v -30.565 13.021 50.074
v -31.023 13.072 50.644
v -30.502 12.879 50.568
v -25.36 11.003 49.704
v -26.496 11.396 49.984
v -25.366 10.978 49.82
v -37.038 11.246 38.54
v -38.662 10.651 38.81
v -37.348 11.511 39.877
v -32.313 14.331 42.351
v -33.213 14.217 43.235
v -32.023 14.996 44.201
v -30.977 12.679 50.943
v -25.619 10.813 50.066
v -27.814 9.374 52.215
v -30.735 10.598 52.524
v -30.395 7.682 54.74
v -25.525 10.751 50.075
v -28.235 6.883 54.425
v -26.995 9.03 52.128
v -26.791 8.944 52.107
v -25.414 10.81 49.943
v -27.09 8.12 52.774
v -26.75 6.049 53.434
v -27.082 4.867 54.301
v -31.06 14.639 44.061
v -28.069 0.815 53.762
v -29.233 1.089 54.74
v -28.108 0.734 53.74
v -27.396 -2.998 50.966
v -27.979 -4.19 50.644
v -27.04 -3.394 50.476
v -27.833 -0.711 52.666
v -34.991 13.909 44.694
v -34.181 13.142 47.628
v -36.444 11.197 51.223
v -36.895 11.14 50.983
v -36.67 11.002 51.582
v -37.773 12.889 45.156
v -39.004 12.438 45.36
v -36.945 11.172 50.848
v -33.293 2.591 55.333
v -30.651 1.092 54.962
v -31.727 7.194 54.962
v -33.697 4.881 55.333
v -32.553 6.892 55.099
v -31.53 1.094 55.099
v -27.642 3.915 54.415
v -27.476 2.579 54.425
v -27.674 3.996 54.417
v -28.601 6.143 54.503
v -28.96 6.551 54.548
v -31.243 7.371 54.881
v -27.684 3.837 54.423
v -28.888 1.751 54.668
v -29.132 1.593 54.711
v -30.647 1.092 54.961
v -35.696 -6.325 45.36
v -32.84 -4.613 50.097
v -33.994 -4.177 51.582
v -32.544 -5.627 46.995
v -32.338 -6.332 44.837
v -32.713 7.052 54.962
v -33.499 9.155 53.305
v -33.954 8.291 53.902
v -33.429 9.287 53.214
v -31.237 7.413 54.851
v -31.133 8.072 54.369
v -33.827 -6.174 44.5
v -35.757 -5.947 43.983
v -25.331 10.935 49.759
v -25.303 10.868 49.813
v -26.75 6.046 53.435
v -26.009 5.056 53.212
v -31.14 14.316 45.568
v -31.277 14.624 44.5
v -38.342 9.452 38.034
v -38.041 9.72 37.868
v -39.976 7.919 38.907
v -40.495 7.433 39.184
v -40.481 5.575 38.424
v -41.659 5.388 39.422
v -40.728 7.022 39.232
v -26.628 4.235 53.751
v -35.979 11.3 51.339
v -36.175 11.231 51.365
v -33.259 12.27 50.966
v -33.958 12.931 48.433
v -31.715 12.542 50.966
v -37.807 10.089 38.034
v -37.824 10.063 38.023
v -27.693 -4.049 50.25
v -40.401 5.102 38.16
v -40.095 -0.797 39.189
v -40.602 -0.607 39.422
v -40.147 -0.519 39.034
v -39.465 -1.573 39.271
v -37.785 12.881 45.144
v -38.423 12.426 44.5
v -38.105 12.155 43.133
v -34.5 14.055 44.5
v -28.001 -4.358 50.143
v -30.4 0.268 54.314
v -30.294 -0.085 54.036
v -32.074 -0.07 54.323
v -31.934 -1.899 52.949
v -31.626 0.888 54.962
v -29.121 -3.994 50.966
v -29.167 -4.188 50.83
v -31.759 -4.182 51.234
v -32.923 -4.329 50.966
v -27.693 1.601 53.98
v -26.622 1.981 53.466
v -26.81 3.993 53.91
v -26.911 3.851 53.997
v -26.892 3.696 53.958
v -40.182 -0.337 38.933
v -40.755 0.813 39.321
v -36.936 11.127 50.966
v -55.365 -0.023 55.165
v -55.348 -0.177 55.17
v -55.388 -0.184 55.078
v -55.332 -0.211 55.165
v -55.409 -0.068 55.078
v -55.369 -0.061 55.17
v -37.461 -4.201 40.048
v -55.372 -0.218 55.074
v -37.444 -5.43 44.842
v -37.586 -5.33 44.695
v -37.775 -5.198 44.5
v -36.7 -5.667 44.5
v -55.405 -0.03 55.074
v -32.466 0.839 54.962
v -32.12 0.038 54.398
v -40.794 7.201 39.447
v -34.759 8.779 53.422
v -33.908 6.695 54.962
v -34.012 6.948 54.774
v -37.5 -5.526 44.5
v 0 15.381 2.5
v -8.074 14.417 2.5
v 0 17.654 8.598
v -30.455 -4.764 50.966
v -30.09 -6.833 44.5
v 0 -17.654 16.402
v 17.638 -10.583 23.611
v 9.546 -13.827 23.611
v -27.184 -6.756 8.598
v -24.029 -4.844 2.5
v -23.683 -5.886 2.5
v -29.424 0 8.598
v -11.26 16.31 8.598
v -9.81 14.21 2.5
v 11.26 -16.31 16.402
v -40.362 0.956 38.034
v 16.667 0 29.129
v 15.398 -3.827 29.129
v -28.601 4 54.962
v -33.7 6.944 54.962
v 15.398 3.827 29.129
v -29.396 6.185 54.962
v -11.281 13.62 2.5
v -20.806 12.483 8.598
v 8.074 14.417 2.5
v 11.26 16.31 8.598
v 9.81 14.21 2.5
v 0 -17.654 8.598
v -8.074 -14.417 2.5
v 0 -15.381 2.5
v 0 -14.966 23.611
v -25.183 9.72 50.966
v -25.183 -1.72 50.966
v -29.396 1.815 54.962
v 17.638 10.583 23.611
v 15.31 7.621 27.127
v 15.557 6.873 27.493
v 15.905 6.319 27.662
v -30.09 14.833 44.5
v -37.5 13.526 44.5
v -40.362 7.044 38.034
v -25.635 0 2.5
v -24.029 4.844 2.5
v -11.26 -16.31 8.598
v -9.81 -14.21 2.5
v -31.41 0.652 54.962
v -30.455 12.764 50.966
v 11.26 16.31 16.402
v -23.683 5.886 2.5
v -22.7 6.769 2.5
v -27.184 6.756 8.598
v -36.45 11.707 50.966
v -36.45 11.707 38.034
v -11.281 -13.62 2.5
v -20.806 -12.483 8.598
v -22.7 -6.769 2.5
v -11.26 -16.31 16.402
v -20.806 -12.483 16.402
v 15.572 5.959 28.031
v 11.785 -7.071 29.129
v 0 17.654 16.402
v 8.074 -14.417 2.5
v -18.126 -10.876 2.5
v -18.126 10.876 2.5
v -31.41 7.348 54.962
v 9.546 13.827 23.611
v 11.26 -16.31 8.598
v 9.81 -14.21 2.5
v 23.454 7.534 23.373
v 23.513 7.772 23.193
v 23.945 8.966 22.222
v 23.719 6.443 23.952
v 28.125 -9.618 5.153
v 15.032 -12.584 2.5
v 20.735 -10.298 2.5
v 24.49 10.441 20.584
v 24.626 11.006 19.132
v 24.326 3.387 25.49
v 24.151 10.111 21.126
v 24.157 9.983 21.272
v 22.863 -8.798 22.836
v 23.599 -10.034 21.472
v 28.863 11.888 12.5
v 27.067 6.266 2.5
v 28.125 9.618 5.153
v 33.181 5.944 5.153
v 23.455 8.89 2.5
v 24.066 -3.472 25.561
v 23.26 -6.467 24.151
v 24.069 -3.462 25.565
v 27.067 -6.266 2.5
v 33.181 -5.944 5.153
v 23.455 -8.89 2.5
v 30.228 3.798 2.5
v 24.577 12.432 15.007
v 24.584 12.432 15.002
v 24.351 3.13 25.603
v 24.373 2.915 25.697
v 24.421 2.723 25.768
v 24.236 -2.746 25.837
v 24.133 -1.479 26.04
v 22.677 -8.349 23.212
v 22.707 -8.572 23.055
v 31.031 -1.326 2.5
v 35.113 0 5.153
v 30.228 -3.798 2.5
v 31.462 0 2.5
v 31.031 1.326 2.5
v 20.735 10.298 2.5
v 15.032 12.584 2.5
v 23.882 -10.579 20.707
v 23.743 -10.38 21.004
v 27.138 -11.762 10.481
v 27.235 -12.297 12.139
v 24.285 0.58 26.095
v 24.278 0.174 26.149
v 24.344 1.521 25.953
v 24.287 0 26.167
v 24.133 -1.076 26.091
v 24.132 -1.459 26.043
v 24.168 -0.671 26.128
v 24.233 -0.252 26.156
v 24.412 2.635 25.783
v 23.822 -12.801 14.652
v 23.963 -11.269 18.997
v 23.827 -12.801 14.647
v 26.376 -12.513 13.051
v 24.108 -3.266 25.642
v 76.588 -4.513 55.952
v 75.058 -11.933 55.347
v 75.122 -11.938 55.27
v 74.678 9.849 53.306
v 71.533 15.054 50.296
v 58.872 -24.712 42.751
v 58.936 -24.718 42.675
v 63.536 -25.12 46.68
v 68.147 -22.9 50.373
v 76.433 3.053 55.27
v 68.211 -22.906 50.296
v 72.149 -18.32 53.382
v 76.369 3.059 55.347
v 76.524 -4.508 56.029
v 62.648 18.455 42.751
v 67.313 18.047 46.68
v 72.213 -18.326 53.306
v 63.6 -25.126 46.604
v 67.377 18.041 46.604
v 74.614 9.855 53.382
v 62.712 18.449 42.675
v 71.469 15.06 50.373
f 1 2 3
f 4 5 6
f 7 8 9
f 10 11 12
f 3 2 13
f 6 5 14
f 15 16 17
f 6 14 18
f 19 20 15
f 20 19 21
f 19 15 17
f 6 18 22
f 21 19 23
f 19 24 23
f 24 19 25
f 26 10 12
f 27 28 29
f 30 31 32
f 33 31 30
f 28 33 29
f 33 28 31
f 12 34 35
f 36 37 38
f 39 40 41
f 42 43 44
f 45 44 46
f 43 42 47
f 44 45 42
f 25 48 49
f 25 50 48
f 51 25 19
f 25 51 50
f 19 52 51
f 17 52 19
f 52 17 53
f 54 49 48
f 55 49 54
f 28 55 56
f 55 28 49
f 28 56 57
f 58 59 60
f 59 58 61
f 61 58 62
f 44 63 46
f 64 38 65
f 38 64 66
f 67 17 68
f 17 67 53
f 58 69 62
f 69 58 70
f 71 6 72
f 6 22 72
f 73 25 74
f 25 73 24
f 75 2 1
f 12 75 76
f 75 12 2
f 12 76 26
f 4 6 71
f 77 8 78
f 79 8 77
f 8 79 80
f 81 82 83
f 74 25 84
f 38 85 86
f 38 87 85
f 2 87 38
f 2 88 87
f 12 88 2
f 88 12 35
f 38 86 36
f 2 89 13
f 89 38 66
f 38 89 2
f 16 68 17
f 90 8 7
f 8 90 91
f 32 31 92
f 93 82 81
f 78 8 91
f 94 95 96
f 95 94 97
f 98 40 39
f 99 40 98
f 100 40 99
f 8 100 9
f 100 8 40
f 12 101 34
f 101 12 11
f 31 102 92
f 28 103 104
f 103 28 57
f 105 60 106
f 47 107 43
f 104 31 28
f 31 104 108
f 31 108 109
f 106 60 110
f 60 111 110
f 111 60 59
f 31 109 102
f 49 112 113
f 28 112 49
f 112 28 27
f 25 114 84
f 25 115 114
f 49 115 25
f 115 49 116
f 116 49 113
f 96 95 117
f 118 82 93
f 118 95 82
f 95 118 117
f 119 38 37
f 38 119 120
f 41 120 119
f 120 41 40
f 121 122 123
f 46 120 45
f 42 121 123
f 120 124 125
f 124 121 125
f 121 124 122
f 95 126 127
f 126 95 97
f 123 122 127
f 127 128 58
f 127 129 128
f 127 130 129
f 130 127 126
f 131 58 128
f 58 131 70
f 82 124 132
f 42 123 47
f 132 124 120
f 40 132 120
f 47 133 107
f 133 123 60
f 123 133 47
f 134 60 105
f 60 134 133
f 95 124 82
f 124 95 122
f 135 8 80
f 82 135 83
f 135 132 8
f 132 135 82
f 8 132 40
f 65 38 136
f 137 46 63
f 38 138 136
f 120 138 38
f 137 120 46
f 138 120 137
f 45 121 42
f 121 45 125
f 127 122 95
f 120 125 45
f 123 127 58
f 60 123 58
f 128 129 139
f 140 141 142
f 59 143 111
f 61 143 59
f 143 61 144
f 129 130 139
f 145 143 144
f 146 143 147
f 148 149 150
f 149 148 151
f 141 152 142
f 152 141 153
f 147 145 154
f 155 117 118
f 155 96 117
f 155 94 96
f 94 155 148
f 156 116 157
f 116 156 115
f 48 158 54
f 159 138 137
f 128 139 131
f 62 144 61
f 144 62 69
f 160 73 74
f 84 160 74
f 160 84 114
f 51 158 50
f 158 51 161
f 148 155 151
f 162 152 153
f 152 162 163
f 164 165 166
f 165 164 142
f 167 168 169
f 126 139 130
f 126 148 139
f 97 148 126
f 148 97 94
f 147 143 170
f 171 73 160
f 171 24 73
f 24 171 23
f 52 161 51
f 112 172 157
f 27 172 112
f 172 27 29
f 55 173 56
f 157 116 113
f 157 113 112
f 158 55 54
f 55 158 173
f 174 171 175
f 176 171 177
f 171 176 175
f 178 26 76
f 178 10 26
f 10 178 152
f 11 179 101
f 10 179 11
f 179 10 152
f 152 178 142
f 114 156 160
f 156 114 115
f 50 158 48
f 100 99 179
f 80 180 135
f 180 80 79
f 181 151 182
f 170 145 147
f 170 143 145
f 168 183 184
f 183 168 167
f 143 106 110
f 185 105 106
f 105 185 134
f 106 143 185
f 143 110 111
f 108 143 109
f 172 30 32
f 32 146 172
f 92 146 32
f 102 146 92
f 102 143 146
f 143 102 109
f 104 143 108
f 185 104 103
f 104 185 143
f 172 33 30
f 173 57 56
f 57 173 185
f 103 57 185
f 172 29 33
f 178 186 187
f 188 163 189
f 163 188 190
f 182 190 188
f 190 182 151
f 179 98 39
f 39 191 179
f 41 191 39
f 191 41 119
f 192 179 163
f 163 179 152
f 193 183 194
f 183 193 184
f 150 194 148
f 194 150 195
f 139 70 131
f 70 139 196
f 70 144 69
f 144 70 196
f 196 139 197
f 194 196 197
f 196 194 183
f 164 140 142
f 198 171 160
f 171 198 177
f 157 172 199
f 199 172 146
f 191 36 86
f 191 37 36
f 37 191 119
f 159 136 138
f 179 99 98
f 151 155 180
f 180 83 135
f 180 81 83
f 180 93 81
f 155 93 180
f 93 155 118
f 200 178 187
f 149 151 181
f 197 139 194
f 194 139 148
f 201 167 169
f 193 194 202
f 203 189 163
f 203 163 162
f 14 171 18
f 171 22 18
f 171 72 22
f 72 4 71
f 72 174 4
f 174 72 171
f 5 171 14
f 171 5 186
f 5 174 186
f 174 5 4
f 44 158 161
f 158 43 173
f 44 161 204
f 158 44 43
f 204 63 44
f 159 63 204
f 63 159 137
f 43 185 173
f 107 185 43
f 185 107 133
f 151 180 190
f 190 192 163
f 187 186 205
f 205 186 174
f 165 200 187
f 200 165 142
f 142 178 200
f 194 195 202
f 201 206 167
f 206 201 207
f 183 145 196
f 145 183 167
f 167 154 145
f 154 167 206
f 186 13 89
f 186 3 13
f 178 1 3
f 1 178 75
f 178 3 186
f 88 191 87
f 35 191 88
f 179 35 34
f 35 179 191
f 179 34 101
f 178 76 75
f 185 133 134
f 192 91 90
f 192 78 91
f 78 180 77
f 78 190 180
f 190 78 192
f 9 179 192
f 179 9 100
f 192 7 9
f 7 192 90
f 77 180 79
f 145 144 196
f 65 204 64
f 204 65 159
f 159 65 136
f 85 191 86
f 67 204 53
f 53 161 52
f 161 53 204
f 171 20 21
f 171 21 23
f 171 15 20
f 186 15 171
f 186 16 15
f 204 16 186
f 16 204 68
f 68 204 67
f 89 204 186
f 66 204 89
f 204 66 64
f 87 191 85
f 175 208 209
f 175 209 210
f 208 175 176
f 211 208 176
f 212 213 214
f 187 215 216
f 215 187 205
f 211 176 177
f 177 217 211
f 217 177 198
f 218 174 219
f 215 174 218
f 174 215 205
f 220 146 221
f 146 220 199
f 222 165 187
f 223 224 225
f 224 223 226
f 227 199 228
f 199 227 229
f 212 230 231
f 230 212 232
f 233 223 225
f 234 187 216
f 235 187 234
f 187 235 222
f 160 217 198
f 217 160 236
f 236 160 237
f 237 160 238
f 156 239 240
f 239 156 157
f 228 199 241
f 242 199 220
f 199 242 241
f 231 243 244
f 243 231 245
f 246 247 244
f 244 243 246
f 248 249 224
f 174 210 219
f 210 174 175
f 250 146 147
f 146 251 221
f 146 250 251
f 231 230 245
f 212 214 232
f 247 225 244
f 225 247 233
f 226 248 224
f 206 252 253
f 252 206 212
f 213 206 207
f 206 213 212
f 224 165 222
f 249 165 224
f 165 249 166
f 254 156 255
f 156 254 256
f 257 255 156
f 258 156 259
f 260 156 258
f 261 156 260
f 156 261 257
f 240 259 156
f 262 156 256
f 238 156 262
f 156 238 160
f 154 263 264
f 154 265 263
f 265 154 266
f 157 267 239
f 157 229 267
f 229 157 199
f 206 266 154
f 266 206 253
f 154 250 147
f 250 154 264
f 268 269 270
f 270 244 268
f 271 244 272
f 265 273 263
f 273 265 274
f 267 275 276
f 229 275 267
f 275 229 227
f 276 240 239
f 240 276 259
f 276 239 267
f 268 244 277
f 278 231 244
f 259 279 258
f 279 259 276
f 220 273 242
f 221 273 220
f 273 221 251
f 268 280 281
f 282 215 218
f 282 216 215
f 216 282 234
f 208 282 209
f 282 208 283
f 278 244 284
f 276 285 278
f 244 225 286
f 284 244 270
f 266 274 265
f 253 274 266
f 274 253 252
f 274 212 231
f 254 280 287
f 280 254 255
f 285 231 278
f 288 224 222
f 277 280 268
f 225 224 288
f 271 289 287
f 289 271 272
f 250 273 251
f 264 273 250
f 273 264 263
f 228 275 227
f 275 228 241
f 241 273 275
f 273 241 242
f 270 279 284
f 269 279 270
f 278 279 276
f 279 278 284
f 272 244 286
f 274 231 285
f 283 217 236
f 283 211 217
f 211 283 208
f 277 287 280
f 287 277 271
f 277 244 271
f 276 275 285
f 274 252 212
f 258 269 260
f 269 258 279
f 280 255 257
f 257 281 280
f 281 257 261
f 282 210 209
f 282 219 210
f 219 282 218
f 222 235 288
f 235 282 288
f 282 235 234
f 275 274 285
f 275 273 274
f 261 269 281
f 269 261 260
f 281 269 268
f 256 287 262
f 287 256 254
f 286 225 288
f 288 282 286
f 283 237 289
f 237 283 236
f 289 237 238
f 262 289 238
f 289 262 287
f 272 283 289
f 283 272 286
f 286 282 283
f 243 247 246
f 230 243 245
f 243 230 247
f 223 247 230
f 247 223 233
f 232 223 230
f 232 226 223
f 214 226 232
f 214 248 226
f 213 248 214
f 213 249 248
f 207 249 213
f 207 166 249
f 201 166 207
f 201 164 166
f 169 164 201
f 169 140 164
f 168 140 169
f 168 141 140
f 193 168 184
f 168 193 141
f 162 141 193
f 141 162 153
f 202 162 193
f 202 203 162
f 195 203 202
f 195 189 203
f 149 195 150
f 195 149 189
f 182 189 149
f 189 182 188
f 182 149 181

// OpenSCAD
// [FL_INDEX: keywords="openscad, 3d_parametric, Bird-o-matic___design_your_printable_bird, csg_solid" | COT="Parametric OpenSCAD design from 3DCodeverse"]
// Title: Bird-o-matic : design your printable bird !

// Better use "fast" when tuning your bird, then "hi" to print it
precision="low"; // [low,med,hi]

// Length of the beak
beak_length= 15; // [0:50]
// Ratio relative to the head size
beak_size= 100; // [20:100]
// Width of the beak tip (0 is pointy)
beak_width= 0; // [0:25]
// Shape of the beak tip (lowest is flat)
beak_roundness= 10; // [10:200]

// Head diameter
head_size=22; // [10:40]
// Horizontal distance from head to main body
head_to_belly=32; // [-20:50]
// Size of the eyes
eye_size=0; // [0:20]
// Head lateral offset
head_lateral_offset=4; // [-15:15]
// Head vertical height
head_level=32; // [0:80]
// Head horizontal rotation
head_yaw=10; // [-45:45]
// Head vertical rotation (positive is upwards)
head_pitch=9; // [-80:45]

// How long is the front body
belly_length=60; // [10:100]
// Belly section size
belly_size=40; // [20:60]
// Additional fatness ratio
belly_fat=90; // [50:150]

// Distance from main body center to bottom center
belly_to_bottom=25; // [1:50]
// Bottom diameter
bottom_size=25; // [5:50]

// Tail length
tail_length= 50; //[0:100]
// How large is the tail
tail_width= 22; // [1:50]
// Tail horizontal rotation
tail_yaw=-5; // [-45:45]
// Tail vertical angle (positive is upwards)
tail_pitch=40; // [-45:90]
// How round is the tail (lowest is flat)
tail_roundness=80; // [10:200]

// How to cut the base of the object (-1 to disable, then use your own slicer options)
base_flat= 50; // [-100:100]

$fa= ( precision=="low" ? 10 : ( precision=="med" ? 5 : 3) );
$fs= ( precision=="low" ? 8 : ( precision=="med" ? 3 : 1.8) );
total_len= beak_length+head_to_belly+belly_to_bottom+tail_length;

module chained_hull()
{
	for(i=[0:$children-2])
		hull()
			for(j=[i,i+1])
				child(j);
}

module skull()
{
	sphere(r=head_size/2);
}

module head()
{
	skull();
	if(eye_size>1)
		for(y=[-1,+1])
			scale([1,y,1])
				rotate([50,-40,0])
					translate([0,0,head_size/2-eye_size/8])
						scale([1,1,0.5])
							sphere(r=eye_size/2, $fs=1);

	scale([1, beak_size/100, beak_size/100])
		hull()
		{
			skull();
			rotate([0,15,0])
				translate([-beak_length-head_size/2,0,0])
					scale([beak_roundness/100,1,1])
						cylinder(r=beak_width?beak_width:0.1,h=0.1); // nose
		}
}

translate([0,0,bottom_size/2])
difference()
{
	translate([-head_to_belly,0,0])
	union()
	{
		translate([0,head_lateral_offset,head_level])
			rotate([0,head_pitch,head_yaw])
				head();

		chained_hull()
		{
			translate([0,head_lateral_offset,head_level])
				sphere(r=head_size/2);

			translate([head_to_belly,0,0])
				scale([belly_length/belly_size,belly_fat/100,1])
					sphere(r=belly_size/2);

			translate([head_to_belly+belly_to_bottom,0,0])
					sphere(r=bottom_size/2);

			if(tail_length && tail_width && tail_roundness)
			translate([head_to_belly+belly_to_bottom,0,0])
				rotate([0,-tail_pitch,tail_yaw])
					translate([tail_length,0,0])
						scale([tail_roundness/100,1,1])
							cylinder(r=tail_width,h=0.1);
		}
	}
	if(base_flat!=-100)
		translate([-total_len*5,-total_len*5,belly_size*(-1.5 + base_flat/200) ])
			cube([total_len*10,total_len*10,belly_size]);
}
